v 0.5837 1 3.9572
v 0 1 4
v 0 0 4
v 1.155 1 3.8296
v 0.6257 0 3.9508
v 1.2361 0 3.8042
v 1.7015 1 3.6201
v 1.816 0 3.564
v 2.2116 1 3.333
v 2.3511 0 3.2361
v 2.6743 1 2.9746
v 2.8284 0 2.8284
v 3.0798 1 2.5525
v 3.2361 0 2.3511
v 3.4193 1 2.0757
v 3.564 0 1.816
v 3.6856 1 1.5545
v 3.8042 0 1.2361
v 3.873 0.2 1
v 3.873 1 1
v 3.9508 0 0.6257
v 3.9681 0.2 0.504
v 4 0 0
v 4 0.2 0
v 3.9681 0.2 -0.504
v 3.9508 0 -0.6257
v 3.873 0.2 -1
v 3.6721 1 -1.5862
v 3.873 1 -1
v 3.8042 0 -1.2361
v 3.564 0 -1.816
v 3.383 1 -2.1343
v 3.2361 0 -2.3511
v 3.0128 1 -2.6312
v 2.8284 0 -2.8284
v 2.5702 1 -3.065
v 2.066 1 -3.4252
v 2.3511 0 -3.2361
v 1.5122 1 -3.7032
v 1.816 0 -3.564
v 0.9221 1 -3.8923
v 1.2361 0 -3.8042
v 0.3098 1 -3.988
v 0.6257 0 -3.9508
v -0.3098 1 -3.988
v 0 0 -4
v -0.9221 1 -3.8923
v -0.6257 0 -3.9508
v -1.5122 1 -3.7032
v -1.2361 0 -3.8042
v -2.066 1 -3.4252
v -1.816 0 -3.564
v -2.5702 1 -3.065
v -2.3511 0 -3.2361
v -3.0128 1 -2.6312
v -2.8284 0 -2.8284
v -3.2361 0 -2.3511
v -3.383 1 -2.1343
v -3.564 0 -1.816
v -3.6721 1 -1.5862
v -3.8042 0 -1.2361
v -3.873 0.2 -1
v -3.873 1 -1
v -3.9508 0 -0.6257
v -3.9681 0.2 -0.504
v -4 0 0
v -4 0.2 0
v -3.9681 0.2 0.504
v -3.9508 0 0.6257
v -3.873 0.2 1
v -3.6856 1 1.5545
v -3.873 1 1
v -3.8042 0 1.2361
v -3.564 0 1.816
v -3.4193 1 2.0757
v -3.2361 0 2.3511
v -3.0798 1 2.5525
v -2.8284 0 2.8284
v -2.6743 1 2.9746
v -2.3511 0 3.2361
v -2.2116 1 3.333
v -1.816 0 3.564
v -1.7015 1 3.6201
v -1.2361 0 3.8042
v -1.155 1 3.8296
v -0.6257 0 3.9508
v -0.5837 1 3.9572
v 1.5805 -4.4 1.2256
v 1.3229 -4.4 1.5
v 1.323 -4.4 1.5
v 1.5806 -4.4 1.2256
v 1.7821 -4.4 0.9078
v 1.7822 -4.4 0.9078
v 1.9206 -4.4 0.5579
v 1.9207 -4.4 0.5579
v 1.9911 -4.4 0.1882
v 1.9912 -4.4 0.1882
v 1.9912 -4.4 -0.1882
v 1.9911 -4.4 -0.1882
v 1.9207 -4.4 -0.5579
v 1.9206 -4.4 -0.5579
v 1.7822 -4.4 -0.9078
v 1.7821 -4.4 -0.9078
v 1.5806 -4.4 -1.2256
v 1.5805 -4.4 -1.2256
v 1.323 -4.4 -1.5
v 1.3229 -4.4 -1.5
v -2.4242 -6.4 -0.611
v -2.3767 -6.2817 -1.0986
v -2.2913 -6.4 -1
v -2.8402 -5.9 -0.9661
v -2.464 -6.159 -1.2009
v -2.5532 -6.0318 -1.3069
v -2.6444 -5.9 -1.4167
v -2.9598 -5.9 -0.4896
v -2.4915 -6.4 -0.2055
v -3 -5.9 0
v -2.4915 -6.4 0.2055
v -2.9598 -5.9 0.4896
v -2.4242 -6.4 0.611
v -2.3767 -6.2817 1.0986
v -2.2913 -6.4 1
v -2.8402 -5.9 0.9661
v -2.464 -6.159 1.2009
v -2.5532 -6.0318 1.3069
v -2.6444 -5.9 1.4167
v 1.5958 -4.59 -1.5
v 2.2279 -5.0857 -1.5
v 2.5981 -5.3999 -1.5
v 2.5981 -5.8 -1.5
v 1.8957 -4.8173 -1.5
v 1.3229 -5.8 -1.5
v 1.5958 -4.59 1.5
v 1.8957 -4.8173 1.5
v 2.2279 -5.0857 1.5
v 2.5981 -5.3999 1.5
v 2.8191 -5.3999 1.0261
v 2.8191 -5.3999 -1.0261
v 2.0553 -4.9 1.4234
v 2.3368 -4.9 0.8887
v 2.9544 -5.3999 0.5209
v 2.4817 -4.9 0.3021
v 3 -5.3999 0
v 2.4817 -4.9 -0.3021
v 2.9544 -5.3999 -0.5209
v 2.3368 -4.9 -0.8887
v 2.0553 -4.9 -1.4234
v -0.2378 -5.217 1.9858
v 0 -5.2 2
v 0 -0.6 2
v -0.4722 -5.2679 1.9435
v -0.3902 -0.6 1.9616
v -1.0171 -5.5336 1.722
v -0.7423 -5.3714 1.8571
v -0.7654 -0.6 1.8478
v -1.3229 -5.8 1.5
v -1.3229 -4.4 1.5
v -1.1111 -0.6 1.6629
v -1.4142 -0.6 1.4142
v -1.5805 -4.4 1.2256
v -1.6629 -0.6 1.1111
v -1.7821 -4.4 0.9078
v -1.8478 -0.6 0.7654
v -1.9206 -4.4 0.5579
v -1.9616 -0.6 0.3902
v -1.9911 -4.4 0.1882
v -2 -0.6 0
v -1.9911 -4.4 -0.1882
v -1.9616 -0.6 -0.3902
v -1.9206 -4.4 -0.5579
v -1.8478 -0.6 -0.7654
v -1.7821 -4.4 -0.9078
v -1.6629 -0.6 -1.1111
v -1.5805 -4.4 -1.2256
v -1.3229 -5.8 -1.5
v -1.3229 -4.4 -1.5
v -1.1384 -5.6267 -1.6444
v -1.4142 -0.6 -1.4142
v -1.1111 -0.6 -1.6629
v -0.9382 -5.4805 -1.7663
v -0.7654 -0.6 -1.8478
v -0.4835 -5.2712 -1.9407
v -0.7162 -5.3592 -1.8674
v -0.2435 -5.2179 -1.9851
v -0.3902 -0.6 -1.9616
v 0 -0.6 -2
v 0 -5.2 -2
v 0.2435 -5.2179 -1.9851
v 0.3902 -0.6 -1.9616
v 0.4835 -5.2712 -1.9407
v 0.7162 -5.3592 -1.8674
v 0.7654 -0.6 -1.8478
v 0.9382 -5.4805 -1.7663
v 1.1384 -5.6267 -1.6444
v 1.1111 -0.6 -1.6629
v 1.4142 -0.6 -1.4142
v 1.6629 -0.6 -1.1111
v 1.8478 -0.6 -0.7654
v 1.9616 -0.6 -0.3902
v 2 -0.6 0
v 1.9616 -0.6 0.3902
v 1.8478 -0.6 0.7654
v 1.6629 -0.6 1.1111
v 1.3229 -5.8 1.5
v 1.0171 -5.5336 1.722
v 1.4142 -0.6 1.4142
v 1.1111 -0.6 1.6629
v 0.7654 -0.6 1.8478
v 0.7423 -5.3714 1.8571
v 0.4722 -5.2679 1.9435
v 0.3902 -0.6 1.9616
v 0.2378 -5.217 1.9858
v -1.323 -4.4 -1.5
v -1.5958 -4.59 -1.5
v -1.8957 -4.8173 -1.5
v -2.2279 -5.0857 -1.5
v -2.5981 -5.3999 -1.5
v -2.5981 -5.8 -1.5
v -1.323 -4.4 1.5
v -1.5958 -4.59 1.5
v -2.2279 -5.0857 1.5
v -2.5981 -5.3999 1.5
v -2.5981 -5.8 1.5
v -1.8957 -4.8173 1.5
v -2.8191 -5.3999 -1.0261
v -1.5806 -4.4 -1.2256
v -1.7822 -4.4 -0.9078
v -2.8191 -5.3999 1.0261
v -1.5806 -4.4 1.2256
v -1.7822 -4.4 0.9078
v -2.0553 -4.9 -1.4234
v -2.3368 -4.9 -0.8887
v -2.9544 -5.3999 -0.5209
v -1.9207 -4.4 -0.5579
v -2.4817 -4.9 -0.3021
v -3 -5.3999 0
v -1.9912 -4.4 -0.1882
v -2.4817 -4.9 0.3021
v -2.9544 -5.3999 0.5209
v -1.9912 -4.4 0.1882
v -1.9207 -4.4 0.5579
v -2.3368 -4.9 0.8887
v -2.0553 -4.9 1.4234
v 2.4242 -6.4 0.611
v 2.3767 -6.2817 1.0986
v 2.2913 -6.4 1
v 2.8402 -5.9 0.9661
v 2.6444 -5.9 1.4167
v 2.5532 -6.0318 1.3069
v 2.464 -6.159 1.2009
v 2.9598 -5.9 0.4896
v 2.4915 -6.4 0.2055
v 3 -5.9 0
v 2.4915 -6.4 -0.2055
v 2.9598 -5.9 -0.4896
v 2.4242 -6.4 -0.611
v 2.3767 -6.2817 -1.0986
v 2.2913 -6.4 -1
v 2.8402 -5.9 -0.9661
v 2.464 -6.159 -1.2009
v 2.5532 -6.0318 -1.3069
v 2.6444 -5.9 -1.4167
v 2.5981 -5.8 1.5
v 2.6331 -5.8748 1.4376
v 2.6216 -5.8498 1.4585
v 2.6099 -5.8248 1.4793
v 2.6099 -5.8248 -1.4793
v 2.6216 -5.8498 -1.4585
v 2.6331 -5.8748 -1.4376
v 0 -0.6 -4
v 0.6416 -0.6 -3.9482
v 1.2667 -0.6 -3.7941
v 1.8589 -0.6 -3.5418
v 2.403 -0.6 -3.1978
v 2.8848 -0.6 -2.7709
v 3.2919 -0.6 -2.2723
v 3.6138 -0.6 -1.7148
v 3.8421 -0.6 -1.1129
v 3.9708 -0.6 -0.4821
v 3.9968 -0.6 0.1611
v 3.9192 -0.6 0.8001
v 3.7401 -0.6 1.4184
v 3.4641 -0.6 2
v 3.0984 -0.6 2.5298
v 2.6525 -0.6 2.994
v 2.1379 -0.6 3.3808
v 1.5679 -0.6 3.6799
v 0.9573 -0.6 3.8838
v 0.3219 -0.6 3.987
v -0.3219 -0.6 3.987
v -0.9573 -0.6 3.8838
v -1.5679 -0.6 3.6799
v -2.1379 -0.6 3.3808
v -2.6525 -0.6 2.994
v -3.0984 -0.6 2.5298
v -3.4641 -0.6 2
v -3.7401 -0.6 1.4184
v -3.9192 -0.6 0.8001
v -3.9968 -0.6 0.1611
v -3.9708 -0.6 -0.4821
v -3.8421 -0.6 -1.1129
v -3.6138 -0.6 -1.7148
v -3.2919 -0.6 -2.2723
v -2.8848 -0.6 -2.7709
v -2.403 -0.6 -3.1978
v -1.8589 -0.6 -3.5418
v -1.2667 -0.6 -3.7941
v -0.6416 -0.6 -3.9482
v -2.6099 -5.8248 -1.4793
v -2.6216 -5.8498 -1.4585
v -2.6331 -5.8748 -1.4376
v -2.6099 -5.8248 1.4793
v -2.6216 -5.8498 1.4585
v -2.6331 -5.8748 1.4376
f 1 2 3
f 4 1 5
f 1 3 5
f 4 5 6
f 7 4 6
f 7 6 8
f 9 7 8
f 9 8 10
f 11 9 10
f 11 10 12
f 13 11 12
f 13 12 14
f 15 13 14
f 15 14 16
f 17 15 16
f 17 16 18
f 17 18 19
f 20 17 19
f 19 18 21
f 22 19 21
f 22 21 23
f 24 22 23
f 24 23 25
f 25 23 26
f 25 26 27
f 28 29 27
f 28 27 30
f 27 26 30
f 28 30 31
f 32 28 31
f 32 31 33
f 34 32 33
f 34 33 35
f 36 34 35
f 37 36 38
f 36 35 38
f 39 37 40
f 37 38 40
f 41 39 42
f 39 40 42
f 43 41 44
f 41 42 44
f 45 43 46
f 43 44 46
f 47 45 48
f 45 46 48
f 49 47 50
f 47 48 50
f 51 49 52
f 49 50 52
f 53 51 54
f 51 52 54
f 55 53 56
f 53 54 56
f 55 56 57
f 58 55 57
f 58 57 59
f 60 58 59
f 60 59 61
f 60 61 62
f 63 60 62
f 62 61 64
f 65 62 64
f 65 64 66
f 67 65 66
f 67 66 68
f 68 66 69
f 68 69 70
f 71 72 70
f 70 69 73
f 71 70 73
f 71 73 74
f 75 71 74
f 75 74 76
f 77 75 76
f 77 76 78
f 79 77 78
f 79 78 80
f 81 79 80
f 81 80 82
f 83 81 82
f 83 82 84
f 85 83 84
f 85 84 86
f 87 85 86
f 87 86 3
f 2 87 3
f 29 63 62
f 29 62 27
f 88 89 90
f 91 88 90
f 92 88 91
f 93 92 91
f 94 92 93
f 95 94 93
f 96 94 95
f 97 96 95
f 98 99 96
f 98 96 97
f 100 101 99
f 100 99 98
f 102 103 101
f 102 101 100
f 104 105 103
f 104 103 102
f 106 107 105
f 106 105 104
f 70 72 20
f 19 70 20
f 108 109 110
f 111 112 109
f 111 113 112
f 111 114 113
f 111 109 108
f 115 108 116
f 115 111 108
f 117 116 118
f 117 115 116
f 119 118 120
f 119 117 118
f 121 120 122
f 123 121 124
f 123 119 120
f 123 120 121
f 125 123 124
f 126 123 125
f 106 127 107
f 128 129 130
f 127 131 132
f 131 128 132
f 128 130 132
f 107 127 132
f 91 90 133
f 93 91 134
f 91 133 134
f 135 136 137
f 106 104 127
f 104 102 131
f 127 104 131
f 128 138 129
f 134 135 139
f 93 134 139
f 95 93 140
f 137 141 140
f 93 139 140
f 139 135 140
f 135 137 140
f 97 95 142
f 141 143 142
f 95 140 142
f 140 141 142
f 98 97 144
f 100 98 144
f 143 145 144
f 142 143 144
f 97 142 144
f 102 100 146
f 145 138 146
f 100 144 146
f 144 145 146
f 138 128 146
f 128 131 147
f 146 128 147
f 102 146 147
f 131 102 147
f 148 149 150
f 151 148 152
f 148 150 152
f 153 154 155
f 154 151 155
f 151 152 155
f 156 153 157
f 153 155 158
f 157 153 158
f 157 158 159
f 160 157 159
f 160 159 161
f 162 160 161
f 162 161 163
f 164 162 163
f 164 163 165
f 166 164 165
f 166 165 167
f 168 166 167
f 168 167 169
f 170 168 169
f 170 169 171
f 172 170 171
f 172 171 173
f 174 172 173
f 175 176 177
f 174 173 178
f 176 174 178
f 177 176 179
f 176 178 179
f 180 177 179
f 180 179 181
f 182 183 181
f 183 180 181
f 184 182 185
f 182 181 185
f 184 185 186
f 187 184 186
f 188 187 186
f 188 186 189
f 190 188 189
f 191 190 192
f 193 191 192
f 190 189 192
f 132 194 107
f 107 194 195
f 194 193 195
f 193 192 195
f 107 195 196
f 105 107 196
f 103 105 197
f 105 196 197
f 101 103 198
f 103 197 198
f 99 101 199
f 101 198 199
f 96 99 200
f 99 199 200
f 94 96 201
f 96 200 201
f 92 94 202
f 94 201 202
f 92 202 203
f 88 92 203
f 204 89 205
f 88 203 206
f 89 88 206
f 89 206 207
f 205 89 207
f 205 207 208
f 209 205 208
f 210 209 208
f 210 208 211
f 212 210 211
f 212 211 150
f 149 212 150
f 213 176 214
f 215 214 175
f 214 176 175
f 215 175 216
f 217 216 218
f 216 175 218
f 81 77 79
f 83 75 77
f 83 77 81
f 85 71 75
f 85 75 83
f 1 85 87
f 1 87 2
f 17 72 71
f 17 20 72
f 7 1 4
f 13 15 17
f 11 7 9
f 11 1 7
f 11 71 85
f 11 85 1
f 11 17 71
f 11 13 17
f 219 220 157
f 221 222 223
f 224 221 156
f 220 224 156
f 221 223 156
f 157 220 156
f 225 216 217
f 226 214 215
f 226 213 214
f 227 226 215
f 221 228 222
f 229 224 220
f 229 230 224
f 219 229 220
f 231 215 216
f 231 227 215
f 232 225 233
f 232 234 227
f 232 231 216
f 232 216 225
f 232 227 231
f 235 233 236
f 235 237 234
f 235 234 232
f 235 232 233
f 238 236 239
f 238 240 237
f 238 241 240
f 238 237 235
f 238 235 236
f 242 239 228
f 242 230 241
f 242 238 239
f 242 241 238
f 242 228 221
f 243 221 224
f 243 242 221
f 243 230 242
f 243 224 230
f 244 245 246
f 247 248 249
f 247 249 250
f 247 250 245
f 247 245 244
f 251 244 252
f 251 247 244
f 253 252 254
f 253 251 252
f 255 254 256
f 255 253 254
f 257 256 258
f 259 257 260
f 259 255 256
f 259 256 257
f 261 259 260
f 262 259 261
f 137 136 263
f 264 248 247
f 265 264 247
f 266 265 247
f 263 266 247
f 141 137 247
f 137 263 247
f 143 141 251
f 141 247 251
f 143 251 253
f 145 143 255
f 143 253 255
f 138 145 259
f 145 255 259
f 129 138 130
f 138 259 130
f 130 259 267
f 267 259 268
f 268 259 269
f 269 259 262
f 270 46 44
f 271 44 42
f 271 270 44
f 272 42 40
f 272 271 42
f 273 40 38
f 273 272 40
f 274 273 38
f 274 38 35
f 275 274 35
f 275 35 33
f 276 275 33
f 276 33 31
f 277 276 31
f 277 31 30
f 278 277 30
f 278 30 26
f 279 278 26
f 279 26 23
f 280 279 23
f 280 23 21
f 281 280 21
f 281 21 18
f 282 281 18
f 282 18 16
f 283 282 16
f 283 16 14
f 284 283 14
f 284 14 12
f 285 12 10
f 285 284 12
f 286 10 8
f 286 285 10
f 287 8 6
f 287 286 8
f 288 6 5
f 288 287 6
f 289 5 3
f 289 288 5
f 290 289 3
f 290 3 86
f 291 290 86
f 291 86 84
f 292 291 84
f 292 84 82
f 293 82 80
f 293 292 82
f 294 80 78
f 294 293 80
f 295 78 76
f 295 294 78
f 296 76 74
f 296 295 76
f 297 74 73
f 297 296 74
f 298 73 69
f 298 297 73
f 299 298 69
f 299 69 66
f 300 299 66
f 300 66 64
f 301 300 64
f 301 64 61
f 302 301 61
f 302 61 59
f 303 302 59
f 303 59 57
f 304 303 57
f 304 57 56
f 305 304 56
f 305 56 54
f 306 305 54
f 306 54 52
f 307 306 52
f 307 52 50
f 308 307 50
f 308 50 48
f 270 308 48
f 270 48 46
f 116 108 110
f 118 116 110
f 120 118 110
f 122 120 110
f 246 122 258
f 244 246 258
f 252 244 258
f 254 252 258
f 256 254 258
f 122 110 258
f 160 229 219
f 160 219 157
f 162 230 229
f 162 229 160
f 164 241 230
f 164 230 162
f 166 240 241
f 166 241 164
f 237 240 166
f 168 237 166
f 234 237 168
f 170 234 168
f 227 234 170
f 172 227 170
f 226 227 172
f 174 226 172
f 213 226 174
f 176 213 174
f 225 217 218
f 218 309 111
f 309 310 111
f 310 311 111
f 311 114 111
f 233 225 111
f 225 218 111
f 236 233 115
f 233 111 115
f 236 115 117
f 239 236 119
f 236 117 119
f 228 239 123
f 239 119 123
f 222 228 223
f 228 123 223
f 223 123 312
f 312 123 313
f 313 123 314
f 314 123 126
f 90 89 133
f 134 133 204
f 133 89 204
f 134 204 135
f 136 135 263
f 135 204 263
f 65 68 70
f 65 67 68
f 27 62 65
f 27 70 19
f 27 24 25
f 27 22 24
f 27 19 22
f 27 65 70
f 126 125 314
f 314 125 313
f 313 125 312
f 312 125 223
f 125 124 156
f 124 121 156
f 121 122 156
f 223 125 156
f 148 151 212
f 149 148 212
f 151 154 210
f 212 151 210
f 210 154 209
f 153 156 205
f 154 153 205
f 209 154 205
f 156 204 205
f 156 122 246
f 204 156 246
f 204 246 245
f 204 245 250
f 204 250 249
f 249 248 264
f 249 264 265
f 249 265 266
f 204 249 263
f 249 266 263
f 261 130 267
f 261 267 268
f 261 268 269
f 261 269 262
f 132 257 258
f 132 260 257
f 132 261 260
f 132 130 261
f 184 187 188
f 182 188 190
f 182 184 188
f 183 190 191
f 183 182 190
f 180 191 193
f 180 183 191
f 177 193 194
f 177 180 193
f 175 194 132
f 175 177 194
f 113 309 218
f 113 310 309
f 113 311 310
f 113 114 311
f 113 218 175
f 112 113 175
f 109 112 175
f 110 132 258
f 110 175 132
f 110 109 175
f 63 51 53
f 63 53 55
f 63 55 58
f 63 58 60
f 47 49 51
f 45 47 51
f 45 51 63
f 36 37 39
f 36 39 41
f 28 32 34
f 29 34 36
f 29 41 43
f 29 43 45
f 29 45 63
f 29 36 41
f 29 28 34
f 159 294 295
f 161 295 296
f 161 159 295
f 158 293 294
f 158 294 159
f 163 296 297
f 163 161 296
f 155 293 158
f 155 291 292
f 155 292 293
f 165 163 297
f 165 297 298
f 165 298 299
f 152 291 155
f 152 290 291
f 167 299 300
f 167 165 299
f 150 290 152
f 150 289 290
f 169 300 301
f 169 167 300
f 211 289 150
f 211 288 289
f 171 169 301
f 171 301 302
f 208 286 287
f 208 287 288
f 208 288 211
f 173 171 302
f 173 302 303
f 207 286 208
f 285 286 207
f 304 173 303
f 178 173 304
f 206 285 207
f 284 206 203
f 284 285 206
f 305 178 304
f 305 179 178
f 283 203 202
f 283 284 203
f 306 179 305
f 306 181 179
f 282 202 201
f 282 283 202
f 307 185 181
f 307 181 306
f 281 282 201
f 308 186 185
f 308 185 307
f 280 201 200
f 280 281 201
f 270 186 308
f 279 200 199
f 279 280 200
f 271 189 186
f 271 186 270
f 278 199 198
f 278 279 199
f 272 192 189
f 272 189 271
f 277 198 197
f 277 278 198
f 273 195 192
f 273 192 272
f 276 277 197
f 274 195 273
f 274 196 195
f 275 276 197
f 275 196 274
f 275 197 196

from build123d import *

# Parameters (mm, degrees)
SKETCH_1_R                      = 4
EXTRUDE_1_DEPTH                 = 1
SKETCH_3_R                      = 2
EXTRUDE_3_DEPTH                 = 6.4
EXTRUDE_4_DEPTH                 = 2
CHAMFER_1_SIZE                  = 0.5
CHAMFER_2_SIZE                  = 1
CUT_EXTRUDE_1_REACH             = 10.542
CUT_EXTRUDE_1_DIRECTION_2_REACH = 10.542
EXTRUDE_START                   = 0.6
SKETCH_6_R                      = 4
EXTRUDE_5_DEPTH                 = 0.6
SKETCH_7_W                      = 8
SKETCH_7_H                      = 2
CUT_EXTRUDE_2_DEPTH             = 0.8


with BuildPart() as part:
    # 草图1 → 凸台-拉伸1 (new body)
    with BuildSketch(Plane(origin=(0, 0, 0), x_dir=(1, 0, 0), z_dir=(0, 1, 0))):
        with Locations(Location((0, 0, 0), (0, 0, 270))):
            Circle(SKETCH_1_R)
    extrude(amount=EXTRUDE_1_DEPTH)

    # 草图3 → 凸台-拉伸3 (add)
    with BuildSketch(Plane(origin=(0, 0, 0), x_dir=(-1, 0, 0), z_dir=(0, -1, 0))):
        with Locations(Location((0, 0, 0), (0, 0, 270))):
            Circle(SKETCH_3_R)
    extrude(amount=EXTRUDE_3_DEPTH)

    # 草图4 → 凸台-拉伸4 (add)
    with BuildSketch(Plane(origin=(0, -6.4, 0), x_dir=(-1, 0, 0), z_dir=(0, -1, 0))):
        with BuildLine():
            Line((2.598076211, -1.5), (-2.598076211, -1.5))
            ThreePointArc((-2.598076211, -1.5), (-3, 0), (-2.598076211, 1.5))
            Line((-2.598076211, 1.5), (2.598076211, 1.5))
            ThreePointArc((2.598076211, 1.5), (3, 0), (2.598076211, -1.5))
        make_face()
    extrude(amount=-EXTRUDE_4_DEPTH)

    # 倒角1
    chamfer_1_edges = [part.edges().sort_by_distance(p)[0] for p in [
        (3, -6.4, 0),
        (-3, -6.4, 0),
    ]]
    chamfer(chamfer_1_edges, length=CHAMFER_1_SIZE)

    # 倒角2
    chamfer_2_edges = [part.edges().sort_by_distance(p)[0] for p in [
        (3, -4.4, 0),
        (-3, -4.4, 0),
    ]]
    chamfer(chamfer_2_edges, length=CHAMFER_2_SIZE - 0.0001)  # a hair under: the kernel refuses the full size

    # 草图5 → 切除-拉伸1 (cut, up to next)
    with BuildSketch(Plane(origin=(0, 0, 0), x_dir=(0, 0, -1), z_dir=(1, 0, 0)), mode=Mode.PRIVATE) as cut_extrude_1_sk1:
        Polygon((2, -5.2), (1, -6.4), (2, -6.4), align=None)
    cut_extrude_1_tool1 = extrude(cut_extrude_1_sk1.sketch, amount=-CUT_EXTRUDE_1_REACH, mode=Mode.PRIVATE) & part.part
    # 草图5 → 切除-拉伸1 (cut, up to next)
    with BuildSketch(Plane(origin=(0, 0, 0), x_dir=(0, 0, -1), z_dir=(1, 0, 0)), mode=Mode.PRIVATE) as cut_extrude_1_sk2:
        Polygon((-2, -5.2), (-2, -6.4), (-1, -6.4), align=None)
    cut_extrude_1_tool2 = extrude(cut_extrude_1_sk2.sketch, amount=-CUT_EXTRUDE_1_REACH, mode=Mode.PRIVATE) & part.part
    add(cut_extrude_1_tool1.solids().sort_by_distance((0, -6, -1.666667))[0], mode=Mode.SUBTRACT)
    add(cut_extrude_1_tool2.solids().sort_by_distance((0, -6, 1.666667))[0], mode=Mode.SUBTRACT)

    # 草图5 → 切除-拉伸1 direction 2 (cut, up to next)
    with BuildSketch(Plane(origin=(0, 0, 0), x_dir=(0, 0, -1), z_dir=(1, 0, 0)), mode=Mode.PRIVATE) as cut_extrude_1_direction_2_sk1:
        Polygon((2, -5.2), (1, -6.4), (2, -6.4), align=None)
    cut_extrude_1_direction_2_tool1 = extrude(cut_extrude_1_direction_2_sk1.sketch, amount=CUT_EXTRUDE_1_DIRECTION_2_REACH, mode=Mode.PRIVATE) & part.part
    # 草图5 → 切除-拉伸1 direction 2 (cut, up to next)
    with BuildSketch(Plane(origin=(0, 0, 0), x_dir=(0, 0, -1), z_dir=(1, 0, 0)), mode=Mode.PRIVATE) as cut_extrude_1_direction_2_sk2:
        Polygon((-2, -5.2), (-2, -6.4), (-1, -6.4), align=None)
    cut_extrude_1_direction_2_tool2 = extrude(cut_extrude_1_direction_2_sk2.sketch, amount=CUT_EXTRUDE_1_DIRECTION_2_REACH, mode=Mode.PRIVATE) & part.part
    add(cut_extrude_1_direction_2_tool1.solids().sort_by_distance((0, -6, -1.666667))[0], mode=Mode.SUBTRACT)
    add(cut_extrude_1_direction_2_tool2.solids().sort_by_distance((0, -6, 1.666667))[0], mode=Mode.SUBTRACT)

    # 草图6 → 凸台-拉伸5 (add)
    with BuildSketch(Plane.XZ.offset(EXTRUDE_START)):
        with Locations(Location((0, 0, 0), (0, 0, 270))):
            Circle(SKETCH_6_R)
    extrude(amount=-EXTRUDE_5_DEPTH)

    # 草图7 → 切除-拉伸2 (cut)
    with BuildSketch(Plane(origin=(0, 1, 0), x_dir=(1, 0, 0), z_dir=(0, 1, 0))):
        Rectangle(SKETCH_7_W, SKETCH_7_H)
    extrude(amount=-CUT_EXTRUDE_2_DEPTH, mode=Mode.SUBTRACT)


solid = part.part
